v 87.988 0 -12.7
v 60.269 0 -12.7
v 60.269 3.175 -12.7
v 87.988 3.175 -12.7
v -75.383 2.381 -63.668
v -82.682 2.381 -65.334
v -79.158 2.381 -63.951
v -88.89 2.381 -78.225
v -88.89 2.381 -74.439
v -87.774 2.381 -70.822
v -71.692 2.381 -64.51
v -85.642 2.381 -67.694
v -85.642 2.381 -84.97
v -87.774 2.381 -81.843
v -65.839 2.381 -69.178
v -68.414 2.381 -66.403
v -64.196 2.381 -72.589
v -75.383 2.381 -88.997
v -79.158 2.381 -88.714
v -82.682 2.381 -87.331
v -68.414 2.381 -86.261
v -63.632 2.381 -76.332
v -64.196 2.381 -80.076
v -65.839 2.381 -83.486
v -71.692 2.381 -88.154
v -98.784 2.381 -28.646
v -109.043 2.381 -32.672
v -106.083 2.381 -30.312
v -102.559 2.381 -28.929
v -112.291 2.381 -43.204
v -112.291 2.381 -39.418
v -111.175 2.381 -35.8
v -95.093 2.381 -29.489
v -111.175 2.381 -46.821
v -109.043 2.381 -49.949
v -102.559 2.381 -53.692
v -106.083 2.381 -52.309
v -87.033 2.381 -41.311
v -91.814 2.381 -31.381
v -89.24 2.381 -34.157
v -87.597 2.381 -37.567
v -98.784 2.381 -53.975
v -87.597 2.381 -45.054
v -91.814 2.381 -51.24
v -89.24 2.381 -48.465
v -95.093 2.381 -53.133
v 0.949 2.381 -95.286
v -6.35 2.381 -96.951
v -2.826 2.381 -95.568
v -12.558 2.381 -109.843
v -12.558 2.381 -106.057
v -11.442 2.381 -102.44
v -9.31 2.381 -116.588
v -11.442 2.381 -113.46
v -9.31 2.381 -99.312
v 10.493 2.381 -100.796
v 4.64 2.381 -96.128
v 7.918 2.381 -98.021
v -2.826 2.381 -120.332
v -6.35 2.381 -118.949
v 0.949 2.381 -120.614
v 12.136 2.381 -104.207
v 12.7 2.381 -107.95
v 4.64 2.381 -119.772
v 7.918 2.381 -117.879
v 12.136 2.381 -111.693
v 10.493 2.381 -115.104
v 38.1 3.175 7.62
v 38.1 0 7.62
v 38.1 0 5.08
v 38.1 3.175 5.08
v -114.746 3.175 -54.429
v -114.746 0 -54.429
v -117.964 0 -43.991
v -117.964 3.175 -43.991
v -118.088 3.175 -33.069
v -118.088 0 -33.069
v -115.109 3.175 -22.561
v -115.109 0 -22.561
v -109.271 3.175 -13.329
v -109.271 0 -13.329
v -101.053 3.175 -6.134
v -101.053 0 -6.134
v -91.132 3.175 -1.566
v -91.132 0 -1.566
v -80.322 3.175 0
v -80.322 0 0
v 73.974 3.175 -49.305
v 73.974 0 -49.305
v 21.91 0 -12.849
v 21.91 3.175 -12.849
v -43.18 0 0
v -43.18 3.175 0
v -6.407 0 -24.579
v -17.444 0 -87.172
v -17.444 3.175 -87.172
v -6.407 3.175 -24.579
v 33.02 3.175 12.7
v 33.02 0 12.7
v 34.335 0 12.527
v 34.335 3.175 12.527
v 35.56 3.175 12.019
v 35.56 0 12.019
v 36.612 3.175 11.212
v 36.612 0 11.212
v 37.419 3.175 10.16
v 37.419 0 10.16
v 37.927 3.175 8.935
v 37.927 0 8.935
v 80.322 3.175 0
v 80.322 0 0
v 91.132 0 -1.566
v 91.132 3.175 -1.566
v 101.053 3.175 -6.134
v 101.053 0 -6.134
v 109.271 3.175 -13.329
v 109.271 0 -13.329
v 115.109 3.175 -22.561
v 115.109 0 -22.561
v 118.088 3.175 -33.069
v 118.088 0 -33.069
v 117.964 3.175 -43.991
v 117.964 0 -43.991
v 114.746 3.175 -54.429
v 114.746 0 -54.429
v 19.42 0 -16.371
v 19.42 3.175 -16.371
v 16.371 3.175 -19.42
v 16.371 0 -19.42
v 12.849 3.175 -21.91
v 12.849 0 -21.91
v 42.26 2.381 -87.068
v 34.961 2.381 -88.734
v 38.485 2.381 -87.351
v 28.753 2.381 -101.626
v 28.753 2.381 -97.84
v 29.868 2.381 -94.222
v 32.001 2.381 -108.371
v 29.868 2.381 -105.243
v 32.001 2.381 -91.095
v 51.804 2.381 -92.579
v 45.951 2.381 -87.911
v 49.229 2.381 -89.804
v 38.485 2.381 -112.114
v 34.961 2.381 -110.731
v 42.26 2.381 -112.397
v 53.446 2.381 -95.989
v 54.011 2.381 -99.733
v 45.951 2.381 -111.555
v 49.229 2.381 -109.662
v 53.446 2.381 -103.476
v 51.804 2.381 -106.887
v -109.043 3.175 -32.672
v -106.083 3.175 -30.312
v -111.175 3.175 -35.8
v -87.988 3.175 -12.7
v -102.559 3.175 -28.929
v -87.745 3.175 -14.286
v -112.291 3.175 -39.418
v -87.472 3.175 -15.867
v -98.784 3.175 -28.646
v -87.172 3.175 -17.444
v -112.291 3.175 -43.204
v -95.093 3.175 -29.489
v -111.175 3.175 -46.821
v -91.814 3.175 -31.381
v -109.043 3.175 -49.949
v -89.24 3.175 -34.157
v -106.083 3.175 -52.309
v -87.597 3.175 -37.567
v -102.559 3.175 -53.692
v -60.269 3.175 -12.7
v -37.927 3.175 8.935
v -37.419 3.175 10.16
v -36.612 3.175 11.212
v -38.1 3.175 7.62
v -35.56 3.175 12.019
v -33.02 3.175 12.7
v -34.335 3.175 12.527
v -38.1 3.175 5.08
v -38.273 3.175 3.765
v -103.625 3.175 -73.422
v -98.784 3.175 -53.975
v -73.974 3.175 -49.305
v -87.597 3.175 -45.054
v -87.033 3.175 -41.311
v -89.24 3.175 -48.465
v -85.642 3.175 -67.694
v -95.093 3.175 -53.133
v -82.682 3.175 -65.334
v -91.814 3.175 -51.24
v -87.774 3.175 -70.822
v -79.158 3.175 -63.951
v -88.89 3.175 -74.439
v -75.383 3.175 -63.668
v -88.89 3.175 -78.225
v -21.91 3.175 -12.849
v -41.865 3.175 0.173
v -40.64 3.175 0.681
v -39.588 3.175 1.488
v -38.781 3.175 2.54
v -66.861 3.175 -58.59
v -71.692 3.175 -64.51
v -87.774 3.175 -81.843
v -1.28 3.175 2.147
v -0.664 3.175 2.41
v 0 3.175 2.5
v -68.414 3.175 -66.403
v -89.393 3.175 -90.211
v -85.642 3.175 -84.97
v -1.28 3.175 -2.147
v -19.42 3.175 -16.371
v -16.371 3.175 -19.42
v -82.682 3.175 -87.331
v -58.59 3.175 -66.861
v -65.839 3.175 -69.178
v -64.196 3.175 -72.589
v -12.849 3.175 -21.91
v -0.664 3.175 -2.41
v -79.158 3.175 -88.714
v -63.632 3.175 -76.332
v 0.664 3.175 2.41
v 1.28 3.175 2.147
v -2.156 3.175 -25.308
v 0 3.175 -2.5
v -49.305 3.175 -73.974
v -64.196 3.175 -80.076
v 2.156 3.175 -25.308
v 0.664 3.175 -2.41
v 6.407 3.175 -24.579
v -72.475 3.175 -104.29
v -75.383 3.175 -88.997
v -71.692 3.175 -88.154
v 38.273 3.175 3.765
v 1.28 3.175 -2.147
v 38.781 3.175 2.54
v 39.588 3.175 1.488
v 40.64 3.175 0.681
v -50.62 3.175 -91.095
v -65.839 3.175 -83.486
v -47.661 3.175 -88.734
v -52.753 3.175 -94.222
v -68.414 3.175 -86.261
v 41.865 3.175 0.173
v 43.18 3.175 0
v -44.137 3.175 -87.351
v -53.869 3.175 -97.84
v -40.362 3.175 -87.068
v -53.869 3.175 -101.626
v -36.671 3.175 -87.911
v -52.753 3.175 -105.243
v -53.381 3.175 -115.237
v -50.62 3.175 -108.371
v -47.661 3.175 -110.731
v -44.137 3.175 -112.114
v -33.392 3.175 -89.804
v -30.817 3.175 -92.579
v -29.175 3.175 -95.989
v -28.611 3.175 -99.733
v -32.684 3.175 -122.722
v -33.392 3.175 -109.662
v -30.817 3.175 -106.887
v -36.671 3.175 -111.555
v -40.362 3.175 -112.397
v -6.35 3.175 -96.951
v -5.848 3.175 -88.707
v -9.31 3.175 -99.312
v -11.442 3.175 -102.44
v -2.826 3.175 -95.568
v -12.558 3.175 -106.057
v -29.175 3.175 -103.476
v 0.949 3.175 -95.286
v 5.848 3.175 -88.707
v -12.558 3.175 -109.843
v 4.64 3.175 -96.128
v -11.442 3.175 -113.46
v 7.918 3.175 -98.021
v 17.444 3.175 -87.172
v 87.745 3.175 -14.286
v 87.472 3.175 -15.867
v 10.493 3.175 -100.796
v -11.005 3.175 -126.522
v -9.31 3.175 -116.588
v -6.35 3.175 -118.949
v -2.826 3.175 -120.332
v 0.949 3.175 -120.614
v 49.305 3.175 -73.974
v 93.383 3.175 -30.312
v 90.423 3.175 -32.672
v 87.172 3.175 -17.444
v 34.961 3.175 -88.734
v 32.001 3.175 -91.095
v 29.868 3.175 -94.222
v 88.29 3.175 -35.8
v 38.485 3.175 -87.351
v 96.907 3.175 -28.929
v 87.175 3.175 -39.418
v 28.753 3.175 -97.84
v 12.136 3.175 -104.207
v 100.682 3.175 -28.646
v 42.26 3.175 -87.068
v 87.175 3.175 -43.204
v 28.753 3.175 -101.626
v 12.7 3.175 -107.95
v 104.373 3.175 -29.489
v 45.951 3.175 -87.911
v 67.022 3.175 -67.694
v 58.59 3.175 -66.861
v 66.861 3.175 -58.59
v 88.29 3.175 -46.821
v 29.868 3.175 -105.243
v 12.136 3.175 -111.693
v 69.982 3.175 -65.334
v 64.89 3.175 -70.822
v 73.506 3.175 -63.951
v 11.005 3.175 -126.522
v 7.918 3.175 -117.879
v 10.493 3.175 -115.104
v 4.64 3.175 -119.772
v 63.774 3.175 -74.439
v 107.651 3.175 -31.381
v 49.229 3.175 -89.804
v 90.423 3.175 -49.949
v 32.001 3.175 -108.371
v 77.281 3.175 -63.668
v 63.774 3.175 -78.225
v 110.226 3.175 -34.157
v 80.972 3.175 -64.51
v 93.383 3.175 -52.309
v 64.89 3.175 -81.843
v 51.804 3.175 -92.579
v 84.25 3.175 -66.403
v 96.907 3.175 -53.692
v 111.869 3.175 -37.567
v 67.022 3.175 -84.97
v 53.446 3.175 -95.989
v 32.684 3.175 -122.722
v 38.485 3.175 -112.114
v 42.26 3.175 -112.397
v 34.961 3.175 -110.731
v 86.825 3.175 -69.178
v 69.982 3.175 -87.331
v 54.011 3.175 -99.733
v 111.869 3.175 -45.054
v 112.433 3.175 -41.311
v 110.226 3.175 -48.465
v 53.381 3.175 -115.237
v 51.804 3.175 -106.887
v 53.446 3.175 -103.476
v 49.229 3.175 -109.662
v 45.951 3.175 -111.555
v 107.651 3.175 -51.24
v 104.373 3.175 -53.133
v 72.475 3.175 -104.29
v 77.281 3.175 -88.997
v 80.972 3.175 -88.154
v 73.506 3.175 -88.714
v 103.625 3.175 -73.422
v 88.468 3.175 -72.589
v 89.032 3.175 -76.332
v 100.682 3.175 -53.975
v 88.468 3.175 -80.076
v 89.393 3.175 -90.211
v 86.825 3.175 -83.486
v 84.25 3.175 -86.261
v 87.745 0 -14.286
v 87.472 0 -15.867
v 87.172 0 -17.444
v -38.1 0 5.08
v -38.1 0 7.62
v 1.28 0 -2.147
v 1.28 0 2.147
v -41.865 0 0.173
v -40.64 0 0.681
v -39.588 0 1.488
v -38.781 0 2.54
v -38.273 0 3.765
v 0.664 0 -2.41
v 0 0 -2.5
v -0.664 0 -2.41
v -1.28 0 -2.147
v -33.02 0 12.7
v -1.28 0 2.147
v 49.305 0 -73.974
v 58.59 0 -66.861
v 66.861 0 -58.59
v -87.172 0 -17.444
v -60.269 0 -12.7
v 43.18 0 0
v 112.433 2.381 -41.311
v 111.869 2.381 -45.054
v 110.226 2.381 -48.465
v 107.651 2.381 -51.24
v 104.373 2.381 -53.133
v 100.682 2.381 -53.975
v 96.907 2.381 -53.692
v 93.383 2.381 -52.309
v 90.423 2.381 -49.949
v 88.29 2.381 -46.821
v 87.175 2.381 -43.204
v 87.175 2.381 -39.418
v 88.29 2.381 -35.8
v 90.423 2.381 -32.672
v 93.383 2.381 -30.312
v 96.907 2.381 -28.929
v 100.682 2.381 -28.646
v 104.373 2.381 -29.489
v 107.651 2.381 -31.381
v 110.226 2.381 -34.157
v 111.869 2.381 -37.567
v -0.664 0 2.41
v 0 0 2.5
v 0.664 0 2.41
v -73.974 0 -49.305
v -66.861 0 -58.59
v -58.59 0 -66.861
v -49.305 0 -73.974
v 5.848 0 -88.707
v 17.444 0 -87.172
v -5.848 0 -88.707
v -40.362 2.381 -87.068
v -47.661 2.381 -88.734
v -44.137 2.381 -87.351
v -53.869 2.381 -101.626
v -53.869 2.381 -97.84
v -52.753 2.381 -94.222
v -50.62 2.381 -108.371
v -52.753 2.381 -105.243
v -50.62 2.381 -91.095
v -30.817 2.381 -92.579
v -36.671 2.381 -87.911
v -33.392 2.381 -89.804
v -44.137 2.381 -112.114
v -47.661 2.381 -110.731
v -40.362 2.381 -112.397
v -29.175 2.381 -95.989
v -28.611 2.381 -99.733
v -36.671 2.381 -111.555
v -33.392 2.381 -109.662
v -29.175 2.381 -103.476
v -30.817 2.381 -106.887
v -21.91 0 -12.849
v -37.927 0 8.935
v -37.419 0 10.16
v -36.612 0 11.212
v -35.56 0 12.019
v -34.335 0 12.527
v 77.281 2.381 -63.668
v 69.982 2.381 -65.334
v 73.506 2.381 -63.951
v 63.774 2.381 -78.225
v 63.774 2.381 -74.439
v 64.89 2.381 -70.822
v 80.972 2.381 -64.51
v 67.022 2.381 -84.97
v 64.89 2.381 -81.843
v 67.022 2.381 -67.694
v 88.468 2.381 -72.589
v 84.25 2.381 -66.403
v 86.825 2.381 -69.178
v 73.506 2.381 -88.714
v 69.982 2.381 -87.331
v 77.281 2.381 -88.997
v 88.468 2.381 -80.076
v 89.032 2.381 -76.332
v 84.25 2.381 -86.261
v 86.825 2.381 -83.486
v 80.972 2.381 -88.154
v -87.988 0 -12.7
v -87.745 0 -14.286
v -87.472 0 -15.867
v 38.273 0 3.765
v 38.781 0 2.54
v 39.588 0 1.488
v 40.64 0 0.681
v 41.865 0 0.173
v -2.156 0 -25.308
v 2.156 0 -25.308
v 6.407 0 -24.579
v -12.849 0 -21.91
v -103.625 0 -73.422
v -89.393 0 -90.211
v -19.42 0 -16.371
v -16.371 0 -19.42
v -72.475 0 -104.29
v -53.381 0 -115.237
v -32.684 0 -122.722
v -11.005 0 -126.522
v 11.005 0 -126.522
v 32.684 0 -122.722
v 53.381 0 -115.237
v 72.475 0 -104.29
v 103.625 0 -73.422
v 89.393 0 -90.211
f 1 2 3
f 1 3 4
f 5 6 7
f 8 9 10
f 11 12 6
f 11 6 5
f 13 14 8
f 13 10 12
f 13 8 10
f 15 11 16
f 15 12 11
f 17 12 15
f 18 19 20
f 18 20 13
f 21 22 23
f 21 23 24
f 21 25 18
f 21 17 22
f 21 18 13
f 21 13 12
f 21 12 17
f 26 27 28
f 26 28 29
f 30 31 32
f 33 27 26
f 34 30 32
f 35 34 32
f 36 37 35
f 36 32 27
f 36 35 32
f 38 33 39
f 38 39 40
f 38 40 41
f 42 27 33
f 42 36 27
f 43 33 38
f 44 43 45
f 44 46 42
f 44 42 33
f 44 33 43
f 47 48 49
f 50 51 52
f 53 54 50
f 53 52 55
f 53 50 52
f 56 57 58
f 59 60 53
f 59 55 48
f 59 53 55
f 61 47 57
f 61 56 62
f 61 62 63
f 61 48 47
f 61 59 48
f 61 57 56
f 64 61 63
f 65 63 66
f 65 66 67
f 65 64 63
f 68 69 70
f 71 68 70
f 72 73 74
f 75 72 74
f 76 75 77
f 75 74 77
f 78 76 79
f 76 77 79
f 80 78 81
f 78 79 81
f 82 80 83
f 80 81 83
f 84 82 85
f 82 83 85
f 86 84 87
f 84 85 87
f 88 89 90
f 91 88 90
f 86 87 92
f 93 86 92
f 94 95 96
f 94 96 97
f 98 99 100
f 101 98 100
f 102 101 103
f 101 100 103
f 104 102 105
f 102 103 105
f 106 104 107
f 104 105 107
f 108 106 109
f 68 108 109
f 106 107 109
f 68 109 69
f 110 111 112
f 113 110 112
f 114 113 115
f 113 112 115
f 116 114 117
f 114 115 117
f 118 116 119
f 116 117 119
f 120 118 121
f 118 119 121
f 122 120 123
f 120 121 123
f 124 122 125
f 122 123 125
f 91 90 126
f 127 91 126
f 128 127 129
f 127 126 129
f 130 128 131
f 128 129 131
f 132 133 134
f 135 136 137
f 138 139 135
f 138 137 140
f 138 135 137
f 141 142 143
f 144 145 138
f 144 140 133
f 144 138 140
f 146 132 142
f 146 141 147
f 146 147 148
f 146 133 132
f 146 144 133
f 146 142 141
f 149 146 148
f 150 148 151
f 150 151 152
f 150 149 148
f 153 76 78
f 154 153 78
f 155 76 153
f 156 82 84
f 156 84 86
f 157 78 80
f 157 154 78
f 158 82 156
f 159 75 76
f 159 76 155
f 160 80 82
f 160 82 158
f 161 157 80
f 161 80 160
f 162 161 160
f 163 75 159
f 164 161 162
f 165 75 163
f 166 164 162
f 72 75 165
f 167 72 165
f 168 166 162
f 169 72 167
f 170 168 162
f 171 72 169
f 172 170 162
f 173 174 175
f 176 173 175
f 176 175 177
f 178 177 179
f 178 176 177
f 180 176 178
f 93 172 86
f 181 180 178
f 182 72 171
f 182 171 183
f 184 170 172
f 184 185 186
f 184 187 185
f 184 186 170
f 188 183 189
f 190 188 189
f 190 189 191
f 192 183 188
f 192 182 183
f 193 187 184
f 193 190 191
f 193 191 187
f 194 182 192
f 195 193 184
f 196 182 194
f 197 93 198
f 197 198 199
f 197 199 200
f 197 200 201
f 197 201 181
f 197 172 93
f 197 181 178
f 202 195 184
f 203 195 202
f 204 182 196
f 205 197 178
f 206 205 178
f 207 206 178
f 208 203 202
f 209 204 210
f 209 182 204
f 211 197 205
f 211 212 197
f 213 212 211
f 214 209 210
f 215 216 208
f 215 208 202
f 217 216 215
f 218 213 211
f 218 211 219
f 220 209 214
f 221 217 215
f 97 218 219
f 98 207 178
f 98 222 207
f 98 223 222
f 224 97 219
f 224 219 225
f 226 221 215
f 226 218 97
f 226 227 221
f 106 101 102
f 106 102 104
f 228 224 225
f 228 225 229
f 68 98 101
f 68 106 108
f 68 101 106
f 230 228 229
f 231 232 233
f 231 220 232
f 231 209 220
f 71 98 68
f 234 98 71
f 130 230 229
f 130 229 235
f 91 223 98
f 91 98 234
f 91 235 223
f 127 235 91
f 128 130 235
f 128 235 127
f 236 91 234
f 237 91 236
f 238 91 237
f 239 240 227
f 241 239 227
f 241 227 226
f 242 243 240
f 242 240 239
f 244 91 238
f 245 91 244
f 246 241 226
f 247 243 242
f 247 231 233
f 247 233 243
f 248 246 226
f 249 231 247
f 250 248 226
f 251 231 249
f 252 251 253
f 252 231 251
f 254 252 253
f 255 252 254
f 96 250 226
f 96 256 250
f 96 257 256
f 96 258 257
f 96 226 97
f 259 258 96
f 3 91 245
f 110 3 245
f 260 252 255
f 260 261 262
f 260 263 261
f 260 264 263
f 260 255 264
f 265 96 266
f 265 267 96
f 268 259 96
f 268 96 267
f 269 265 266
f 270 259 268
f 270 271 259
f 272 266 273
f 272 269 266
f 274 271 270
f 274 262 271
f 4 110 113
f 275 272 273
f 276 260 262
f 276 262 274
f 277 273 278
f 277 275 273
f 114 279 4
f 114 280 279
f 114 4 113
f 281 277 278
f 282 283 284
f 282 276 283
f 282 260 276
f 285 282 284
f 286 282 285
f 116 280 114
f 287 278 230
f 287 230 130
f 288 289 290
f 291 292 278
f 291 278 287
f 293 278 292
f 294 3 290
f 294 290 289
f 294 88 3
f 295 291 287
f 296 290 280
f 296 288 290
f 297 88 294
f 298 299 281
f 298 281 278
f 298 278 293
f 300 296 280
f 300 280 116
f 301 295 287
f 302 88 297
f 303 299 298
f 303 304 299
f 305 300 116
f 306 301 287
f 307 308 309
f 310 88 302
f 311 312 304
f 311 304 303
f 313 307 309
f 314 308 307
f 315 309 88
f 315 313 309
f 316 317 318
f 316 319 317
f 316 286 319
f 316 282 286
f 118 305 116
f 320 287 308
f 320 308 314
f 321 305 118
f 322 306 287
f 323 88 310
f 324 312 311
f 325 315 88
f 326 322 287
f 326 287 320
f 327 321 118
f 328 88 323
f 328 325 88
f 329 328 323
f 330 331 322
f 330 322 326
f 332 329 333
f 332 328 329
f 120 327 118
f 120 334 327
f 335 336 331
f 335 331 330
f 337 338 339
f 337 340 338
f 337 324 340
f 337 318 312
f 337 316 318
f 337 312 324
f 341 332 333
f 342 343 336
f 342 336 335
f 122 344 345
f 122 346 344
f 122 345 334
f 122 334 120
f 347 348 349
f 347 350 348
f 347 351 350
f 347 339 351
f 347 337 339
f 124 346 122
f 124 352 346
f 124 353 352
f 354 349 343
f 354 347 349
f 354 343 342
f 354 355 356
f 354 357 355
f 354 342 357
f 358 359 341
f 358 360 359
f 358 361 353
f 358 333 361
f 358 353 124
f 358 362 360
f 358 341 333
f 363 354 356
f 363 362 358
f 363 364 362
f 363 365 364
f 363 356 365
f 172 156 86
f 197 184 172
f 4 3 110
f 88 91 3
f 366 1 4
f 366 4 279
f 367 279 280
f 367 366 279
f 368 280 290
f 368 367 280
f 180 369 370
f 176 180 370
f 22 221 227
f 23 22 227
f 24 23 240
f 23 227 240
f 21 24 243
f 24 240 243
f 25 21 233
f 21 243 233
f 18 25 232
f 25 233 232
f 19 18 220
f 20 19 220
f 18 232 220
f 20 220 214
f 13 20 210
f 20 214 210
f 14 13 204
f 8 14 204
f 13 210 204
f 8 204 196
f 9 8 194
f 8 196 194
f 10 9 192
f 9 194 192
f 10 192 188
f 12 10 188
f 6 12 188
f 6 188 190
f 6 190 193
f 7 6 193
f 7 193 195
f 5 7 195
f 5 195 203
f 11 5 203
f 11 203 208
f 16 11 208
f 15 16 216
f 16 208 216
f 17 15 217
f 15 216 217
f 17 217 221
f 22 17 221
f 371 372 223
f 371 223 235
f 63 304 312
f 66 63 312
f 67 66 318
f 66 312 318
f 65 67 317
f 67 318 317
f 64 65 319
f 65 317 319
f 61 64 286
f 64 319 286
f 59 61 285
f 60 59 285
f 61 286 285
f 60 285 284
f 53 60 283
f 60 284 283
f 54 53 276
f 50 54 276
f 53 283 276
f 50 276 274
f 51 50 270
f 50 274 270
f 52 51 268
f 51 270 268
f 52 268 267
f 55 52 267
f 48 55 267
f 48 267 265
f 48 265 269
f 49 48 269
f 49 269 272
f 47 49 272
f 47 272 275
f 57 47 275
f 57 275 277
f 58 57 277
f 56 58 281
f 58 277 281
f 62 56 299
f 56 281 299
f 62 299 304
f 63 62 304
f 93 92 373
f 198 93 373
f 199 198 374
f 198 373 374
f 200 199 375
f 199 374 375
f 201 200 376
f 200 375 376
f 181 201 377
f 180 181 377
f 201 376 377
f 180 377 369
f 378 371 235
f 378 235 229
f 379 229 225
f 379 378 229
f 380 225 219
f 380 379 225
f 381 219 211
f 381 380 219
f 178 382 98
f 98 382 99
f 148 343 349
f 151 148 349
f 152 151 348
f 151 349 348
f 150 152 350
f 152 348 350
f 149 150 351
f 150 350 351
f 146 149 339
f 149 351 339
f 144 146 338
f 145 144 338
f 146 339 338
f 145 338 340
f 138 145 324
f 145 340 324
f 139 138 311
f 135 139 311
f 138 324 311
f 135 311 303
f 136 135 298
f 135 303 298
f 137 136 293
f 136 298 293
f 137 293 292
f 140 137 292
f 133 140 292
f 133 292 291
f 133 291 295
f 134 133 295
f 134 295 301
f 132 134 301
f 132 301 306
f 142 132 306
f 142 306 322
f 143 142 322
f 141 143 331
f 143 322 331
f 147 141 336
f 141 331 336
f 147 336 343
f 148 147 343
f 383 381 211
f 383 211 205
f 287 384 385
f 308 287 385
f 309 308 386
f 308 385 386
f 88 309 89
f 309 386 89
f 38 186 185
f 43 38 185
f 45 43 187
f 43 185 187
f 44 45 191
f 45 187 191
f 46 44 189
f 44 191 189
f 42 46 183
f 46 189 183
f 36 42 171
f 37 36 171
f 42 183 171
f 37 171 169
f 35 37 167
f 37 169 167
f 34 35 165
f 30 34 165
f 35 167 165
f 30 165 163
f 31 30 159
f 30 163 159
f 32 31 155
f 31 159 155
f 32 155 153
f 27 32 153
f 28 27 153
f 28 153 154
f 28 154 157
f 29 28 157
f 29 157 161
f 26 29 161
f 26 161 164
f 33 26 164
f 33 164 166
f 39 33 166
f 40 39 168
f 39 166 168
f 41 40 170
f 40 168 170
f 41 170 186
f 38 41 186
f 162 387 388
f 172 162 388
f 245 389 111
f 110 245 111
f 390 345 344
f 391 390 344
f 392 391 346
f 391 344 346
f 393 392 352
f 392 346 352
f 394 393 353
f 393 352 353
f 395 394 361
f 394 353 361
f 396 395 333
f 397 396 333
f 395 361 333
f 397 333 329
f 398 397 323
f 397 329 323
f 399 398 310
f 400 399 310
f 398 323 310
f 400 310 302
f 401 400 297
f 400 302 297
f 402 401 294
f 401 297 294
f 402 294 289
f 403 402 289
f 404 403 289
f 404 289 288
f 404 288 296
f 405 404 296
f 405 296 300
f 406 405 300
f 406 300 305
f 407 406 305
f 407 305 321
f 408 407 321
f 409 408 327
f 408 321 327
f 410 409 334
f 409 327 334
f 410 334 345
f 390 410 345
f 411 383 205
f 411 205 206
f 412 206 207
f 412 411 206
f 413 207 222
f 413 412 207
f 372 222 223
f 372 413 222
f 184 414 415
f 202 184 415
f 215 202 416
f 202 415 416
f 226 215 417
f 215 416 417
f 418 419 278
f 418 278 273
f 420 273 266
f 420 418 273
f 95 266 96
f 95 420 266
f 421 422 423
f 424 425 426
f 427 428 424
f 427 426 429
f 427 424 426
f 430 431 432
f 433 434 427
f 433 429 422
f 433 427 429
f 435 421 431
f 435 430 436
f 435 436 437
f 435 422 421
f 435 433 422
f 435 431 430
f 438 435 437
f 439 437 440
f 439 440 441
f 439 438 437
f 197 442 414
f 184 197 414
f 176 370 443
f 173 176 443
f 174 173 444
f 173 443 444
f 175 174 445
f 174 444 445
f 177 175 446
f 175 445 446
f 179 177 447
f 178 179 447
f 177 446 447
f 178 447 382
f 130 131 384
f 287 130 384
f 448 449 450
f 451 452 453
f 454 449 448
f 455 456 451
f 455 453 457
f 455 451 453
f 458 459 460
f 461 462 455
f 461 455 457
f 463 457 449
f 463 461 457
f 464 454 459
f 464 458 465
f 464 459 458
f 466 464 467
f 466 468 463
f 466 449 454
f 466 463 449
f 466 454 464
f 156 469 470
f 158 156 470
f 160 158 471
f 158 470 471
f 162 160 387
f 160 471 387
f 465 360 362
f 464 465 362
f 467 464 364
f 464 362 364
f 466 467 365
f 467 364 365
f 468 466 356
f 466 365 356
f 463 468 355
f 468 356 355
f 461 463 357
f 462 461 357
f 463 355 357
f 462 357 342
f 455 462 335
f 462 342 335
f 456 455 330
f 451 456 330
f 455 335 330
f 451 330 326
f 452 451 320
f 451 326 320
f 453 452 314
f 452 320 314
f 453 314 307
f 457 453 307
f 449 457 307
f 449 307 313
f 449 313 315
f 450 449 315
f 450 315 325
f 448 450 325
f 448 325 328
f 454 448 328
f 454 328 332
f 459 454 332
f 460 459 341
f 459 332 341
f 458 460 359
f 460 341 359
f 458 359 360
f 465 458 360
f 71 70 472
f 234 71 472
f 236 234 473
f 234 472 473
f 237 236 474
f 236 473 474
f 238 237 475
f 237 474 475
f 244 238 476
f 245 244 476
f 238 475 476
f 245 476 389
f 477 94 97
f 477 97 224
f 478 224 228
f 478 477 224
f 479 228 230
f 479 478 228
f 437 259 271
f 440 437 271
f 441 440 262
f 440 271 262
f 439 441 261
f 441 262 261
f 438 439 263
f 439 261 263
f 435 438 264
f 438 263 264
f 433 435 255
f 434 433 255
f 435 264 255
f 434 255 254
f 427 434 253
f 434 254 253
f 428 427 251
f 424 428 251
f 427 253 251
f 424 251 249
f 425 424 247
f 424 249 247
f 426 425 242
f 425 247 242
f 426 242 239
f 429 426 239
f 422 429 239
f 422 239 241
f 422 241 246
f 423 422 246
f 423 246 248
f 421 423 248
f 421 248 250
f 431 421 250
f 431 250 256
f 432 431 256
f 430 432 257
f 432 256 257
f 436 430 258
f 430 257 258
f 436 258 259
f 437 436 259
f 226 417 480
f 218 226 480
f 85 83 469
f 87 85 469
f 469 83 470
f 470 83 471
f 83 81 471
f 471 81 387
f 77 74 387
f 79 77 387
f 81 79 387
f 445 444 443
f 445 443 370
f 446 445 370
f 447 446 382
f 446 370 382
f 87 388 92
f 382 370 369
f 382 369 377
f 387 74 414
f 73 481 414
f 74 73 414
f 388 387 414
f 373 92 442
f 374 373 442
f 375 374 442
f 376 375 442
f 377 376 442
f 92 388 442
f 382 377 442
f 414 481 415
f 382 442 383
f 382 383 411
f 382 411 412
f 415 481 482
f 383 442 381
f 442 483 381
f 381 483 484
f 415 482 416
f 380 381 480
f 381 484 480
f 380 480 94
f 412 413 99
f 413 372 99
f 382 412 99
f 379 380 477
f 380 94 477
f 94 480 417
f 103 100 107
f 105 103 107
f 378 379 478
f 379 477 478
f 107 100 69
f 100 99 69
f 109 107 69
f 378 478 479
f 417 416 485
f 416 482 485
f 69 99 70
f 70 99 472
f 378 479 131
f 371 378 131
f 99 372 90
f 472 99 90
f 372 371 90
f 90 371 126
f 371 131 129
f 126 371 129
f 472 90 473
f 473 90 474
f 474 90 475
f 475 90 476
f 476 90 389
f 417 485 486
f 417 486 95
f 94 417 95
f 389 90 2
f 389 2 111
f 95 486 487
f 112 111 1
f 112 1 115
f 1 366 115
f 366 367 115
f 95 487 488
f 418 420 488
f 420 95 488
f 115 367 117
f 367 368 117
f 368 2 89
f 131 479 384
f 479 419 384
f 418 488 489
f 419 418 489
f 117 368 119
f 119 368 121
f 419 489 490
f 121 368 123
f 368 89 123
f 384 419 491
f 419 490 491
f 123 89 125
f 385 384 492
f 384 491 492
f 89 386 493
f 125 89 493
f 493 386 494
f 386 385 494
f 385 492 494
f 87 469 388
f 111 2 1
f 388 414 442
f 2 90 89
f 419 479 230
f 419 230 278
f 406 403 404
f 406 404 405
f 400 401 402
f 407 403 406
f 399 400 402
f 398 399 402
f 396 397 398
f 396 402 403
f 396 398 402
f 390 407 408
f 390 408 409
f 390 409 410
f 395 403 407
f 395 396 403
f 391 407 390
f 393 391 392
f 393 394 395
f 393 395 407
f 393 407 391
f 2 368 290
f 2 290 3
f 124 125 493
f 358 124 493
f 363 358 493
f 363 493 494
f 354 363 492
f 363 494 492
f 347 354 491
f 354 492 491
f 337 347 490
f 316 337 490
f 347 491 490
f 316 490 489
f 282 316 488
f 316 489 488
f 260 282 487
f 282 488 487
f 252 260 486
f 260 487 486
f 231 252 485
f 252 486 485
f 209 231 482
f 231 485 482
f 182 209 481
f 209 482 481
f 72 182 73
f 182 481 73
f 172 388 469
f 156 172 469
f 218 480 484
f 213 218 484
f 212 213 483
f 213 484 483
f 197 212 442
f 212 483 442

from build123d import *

# Parameters (mm, degrees)
BOSS_EXTRUDE1_DEPTH = 3.175
CUT_EXTRUDE4_START  = 3.175
SKETCH1_4_R         = 12.7
CUT_EXTRUDE4_DEPTH  = 0.79375


with BuildPart() as part:
    # Sketch1 → Boss-Extrude1 (new body)
    with BuildSketch(Plane(origin=(0, 0, 0), x_dir=(1, 0, 0), z_dir=(0, 1, 0))):
        with BuildLine():
            ThreePointArc((-88.894631333, 0.976995485), (-84.635987937, 0.245036838), (-80.321852568, 0))
            Line((-80.321852568, 0), (-43.18, 0))
            ThreePointArc((-43.18, 0), (-39.587897552, -1.487897552), (-38.1, -5.08))
            Line((-38.1, -5.08), (-38.1, -7.62))
            ThreePointArc((-38.1, -7.62), (-38.067046449, -8.197686885), (-37.968613332, -8.767878954))
            ThreePointArc((-37.968613332, -8.767878954), (-36.180314455, -11.597287083), (-33.02, -12.7))
            Line((-33.02, -12.7), (33.02, -12.7))
            ThreePointArc((33.02, -12.7), (36.180314455, -11.597287083), (37.968613332, -8.767878954))
            ThreePointArc((37.968613332, -8.767878954), (38.067046449, -8.197686885), (38.1, -7.62))
            Line((38.1, -7.62), (38.1, -5.08))
            ThreePointArc((38.1, -5.08), (39.587897552, -1.487897552), (43.18, 0))
            Line((43.18, 0), (80.321852568, 0))
            ThreePointArc((80.321852568, 0), (84.635987937, 0.245036838), (88.894631333, 0.976995485))
            ThreePointArc((88.894631333, 0.976995485), (114.6211381, 21.511780928), (114.745503669, 54.428571429))
            ThreePointArc((114.745503669, 54.428571429), (0, 127), (-114.745503669, 54.428571429))
            ThreePointArc((-114.745503669, 54.428571429), (-114.6211381, 21.511780928), (-88.894631333, 0.976995485))
        make_face()
        with BuildLine():
            Line((-60.268779933, 12.7), (-87.988181024, 12.7))
            ThreePointArc((-87.988181024, 12.7), (-87.612112441, 15.077392137), (-87.171820099, 17.443731844))
            Line((-87.171820099, 17.443731844), (-60.268779933, 12.7))
        make_face(mode=Mode.SUBTRACT)
        with BuildLine():
            Line((-1.28, -2.14746362), (-1.28, 2.14746362))
            ThreePointArc((-1.28, 2.14746362), (0, 2.5), (1.28, 2.14746362))
            Line((1.28, 2.14746362), (1.28, -2.14746362))
            ThreePointArc((1.28, -2.14746362), (0, -2.5), (-1.28, -2.14746362))
        make_face(mode=Mode.SUBTRACT)
        with BuildLine():
            ThreePointArc((87.171820099, 17.443731844), (87.612112441, 15.077392137), (87.988181024, 12.7))
            Line((87.988181024, 12.7), (60.268779933, 12.7))
            Line((60.268779933, 12.7), (87.171820099, 17.443731844))
        make_face(mode=Mode.SUBTRACT)
        with BuildLine():
            ThreePointArc((-73.974366197, 49.305204044), (-62.861792847, 62.861792847), (-49.305204044, 73.974366197))
            Line((-49.305204044, 73.974366197), (-12.849413735, 21.910101932))
            ThreePointArc((-12.849413735, 21.910101932), (-17.960512242, 17.960512242), (-21.910101932, 12.849413735))
            Line((-21.910101932, 12.849413735), (-73.974366197, 49.305204044))
        make_face(mode=Mode.SUBTRACT)
        with BuildLine():
            ThreePointArc((49.305204044, 73.974366197), (62.861792847, 62.861792847), (73.974366197, 49.305204044))
            Line((73.974366197, 49.305204044), (21.910101932, 12.849413735))
            ThreePointArc((21.910101932, 12.849413735), (17.960512242, 17.960512242), (12.849413735, 21.910101932))
            Line((12.849413735, 21.910101932), (49.305204044, 73.974366197))
        make_face(mode=Mode.SUBTRACT)
        with BuildLine():
            Line((-6.406874067, 24.578689239), (-17.443731844, 87.171820099))
            ThreePointArc((-17.443731844, 87.171820099), (0, 88.9), (17.443731844, 87.171820099))
            Line((17.443731844, 87.171820099), (6.406874067, 24.578689239))
            ThreePointArc((6.406874067, 24.578689239), (0, 25.4), (-6.406874067, 24.578689239))
        make_face(mode=Mode.SUBTRACT)
    extrude(amount=BOSS_EXTRUDE1_DEPTH)

    # Sketch1<4> → Cut-Extrude4 (cut)
    with BuildSketch(Plane(origin=(0, 0, 0), x_dir=(1, 0, 0), z_dir=(0, 1, 0)).offset(CUT_EXTRUDE4_START)):
        with Locations((-99.732795535, 41.310676524)):
            Circle(SKETCH1_4_R)
        with Locations((-76.332177029, 76.332177029)):
            Circle(SKETCH1_4_R)
        with Locations((-41.310676524, 99.732795535)):
            Circle(SKETCH1_4_R)
        with Locations((0, 107.95)):
            Circle(SKETCH1_4_R)
        with Locations((41.310676524, 99.732795535)):
            Circle(SKETCH1_4_R)
        with Locations((76.332177029, 76.332177029)):
            Circle(SKETCH1_4_R)
        with Locations((99.732795535, 41.310676524)):
            Circle(SKETCH1_4_R)
    extrude(amount=-CUT_EXTRUDE4_DEPTH, mode=Mode.SUBTRACT)


solid = part.part
